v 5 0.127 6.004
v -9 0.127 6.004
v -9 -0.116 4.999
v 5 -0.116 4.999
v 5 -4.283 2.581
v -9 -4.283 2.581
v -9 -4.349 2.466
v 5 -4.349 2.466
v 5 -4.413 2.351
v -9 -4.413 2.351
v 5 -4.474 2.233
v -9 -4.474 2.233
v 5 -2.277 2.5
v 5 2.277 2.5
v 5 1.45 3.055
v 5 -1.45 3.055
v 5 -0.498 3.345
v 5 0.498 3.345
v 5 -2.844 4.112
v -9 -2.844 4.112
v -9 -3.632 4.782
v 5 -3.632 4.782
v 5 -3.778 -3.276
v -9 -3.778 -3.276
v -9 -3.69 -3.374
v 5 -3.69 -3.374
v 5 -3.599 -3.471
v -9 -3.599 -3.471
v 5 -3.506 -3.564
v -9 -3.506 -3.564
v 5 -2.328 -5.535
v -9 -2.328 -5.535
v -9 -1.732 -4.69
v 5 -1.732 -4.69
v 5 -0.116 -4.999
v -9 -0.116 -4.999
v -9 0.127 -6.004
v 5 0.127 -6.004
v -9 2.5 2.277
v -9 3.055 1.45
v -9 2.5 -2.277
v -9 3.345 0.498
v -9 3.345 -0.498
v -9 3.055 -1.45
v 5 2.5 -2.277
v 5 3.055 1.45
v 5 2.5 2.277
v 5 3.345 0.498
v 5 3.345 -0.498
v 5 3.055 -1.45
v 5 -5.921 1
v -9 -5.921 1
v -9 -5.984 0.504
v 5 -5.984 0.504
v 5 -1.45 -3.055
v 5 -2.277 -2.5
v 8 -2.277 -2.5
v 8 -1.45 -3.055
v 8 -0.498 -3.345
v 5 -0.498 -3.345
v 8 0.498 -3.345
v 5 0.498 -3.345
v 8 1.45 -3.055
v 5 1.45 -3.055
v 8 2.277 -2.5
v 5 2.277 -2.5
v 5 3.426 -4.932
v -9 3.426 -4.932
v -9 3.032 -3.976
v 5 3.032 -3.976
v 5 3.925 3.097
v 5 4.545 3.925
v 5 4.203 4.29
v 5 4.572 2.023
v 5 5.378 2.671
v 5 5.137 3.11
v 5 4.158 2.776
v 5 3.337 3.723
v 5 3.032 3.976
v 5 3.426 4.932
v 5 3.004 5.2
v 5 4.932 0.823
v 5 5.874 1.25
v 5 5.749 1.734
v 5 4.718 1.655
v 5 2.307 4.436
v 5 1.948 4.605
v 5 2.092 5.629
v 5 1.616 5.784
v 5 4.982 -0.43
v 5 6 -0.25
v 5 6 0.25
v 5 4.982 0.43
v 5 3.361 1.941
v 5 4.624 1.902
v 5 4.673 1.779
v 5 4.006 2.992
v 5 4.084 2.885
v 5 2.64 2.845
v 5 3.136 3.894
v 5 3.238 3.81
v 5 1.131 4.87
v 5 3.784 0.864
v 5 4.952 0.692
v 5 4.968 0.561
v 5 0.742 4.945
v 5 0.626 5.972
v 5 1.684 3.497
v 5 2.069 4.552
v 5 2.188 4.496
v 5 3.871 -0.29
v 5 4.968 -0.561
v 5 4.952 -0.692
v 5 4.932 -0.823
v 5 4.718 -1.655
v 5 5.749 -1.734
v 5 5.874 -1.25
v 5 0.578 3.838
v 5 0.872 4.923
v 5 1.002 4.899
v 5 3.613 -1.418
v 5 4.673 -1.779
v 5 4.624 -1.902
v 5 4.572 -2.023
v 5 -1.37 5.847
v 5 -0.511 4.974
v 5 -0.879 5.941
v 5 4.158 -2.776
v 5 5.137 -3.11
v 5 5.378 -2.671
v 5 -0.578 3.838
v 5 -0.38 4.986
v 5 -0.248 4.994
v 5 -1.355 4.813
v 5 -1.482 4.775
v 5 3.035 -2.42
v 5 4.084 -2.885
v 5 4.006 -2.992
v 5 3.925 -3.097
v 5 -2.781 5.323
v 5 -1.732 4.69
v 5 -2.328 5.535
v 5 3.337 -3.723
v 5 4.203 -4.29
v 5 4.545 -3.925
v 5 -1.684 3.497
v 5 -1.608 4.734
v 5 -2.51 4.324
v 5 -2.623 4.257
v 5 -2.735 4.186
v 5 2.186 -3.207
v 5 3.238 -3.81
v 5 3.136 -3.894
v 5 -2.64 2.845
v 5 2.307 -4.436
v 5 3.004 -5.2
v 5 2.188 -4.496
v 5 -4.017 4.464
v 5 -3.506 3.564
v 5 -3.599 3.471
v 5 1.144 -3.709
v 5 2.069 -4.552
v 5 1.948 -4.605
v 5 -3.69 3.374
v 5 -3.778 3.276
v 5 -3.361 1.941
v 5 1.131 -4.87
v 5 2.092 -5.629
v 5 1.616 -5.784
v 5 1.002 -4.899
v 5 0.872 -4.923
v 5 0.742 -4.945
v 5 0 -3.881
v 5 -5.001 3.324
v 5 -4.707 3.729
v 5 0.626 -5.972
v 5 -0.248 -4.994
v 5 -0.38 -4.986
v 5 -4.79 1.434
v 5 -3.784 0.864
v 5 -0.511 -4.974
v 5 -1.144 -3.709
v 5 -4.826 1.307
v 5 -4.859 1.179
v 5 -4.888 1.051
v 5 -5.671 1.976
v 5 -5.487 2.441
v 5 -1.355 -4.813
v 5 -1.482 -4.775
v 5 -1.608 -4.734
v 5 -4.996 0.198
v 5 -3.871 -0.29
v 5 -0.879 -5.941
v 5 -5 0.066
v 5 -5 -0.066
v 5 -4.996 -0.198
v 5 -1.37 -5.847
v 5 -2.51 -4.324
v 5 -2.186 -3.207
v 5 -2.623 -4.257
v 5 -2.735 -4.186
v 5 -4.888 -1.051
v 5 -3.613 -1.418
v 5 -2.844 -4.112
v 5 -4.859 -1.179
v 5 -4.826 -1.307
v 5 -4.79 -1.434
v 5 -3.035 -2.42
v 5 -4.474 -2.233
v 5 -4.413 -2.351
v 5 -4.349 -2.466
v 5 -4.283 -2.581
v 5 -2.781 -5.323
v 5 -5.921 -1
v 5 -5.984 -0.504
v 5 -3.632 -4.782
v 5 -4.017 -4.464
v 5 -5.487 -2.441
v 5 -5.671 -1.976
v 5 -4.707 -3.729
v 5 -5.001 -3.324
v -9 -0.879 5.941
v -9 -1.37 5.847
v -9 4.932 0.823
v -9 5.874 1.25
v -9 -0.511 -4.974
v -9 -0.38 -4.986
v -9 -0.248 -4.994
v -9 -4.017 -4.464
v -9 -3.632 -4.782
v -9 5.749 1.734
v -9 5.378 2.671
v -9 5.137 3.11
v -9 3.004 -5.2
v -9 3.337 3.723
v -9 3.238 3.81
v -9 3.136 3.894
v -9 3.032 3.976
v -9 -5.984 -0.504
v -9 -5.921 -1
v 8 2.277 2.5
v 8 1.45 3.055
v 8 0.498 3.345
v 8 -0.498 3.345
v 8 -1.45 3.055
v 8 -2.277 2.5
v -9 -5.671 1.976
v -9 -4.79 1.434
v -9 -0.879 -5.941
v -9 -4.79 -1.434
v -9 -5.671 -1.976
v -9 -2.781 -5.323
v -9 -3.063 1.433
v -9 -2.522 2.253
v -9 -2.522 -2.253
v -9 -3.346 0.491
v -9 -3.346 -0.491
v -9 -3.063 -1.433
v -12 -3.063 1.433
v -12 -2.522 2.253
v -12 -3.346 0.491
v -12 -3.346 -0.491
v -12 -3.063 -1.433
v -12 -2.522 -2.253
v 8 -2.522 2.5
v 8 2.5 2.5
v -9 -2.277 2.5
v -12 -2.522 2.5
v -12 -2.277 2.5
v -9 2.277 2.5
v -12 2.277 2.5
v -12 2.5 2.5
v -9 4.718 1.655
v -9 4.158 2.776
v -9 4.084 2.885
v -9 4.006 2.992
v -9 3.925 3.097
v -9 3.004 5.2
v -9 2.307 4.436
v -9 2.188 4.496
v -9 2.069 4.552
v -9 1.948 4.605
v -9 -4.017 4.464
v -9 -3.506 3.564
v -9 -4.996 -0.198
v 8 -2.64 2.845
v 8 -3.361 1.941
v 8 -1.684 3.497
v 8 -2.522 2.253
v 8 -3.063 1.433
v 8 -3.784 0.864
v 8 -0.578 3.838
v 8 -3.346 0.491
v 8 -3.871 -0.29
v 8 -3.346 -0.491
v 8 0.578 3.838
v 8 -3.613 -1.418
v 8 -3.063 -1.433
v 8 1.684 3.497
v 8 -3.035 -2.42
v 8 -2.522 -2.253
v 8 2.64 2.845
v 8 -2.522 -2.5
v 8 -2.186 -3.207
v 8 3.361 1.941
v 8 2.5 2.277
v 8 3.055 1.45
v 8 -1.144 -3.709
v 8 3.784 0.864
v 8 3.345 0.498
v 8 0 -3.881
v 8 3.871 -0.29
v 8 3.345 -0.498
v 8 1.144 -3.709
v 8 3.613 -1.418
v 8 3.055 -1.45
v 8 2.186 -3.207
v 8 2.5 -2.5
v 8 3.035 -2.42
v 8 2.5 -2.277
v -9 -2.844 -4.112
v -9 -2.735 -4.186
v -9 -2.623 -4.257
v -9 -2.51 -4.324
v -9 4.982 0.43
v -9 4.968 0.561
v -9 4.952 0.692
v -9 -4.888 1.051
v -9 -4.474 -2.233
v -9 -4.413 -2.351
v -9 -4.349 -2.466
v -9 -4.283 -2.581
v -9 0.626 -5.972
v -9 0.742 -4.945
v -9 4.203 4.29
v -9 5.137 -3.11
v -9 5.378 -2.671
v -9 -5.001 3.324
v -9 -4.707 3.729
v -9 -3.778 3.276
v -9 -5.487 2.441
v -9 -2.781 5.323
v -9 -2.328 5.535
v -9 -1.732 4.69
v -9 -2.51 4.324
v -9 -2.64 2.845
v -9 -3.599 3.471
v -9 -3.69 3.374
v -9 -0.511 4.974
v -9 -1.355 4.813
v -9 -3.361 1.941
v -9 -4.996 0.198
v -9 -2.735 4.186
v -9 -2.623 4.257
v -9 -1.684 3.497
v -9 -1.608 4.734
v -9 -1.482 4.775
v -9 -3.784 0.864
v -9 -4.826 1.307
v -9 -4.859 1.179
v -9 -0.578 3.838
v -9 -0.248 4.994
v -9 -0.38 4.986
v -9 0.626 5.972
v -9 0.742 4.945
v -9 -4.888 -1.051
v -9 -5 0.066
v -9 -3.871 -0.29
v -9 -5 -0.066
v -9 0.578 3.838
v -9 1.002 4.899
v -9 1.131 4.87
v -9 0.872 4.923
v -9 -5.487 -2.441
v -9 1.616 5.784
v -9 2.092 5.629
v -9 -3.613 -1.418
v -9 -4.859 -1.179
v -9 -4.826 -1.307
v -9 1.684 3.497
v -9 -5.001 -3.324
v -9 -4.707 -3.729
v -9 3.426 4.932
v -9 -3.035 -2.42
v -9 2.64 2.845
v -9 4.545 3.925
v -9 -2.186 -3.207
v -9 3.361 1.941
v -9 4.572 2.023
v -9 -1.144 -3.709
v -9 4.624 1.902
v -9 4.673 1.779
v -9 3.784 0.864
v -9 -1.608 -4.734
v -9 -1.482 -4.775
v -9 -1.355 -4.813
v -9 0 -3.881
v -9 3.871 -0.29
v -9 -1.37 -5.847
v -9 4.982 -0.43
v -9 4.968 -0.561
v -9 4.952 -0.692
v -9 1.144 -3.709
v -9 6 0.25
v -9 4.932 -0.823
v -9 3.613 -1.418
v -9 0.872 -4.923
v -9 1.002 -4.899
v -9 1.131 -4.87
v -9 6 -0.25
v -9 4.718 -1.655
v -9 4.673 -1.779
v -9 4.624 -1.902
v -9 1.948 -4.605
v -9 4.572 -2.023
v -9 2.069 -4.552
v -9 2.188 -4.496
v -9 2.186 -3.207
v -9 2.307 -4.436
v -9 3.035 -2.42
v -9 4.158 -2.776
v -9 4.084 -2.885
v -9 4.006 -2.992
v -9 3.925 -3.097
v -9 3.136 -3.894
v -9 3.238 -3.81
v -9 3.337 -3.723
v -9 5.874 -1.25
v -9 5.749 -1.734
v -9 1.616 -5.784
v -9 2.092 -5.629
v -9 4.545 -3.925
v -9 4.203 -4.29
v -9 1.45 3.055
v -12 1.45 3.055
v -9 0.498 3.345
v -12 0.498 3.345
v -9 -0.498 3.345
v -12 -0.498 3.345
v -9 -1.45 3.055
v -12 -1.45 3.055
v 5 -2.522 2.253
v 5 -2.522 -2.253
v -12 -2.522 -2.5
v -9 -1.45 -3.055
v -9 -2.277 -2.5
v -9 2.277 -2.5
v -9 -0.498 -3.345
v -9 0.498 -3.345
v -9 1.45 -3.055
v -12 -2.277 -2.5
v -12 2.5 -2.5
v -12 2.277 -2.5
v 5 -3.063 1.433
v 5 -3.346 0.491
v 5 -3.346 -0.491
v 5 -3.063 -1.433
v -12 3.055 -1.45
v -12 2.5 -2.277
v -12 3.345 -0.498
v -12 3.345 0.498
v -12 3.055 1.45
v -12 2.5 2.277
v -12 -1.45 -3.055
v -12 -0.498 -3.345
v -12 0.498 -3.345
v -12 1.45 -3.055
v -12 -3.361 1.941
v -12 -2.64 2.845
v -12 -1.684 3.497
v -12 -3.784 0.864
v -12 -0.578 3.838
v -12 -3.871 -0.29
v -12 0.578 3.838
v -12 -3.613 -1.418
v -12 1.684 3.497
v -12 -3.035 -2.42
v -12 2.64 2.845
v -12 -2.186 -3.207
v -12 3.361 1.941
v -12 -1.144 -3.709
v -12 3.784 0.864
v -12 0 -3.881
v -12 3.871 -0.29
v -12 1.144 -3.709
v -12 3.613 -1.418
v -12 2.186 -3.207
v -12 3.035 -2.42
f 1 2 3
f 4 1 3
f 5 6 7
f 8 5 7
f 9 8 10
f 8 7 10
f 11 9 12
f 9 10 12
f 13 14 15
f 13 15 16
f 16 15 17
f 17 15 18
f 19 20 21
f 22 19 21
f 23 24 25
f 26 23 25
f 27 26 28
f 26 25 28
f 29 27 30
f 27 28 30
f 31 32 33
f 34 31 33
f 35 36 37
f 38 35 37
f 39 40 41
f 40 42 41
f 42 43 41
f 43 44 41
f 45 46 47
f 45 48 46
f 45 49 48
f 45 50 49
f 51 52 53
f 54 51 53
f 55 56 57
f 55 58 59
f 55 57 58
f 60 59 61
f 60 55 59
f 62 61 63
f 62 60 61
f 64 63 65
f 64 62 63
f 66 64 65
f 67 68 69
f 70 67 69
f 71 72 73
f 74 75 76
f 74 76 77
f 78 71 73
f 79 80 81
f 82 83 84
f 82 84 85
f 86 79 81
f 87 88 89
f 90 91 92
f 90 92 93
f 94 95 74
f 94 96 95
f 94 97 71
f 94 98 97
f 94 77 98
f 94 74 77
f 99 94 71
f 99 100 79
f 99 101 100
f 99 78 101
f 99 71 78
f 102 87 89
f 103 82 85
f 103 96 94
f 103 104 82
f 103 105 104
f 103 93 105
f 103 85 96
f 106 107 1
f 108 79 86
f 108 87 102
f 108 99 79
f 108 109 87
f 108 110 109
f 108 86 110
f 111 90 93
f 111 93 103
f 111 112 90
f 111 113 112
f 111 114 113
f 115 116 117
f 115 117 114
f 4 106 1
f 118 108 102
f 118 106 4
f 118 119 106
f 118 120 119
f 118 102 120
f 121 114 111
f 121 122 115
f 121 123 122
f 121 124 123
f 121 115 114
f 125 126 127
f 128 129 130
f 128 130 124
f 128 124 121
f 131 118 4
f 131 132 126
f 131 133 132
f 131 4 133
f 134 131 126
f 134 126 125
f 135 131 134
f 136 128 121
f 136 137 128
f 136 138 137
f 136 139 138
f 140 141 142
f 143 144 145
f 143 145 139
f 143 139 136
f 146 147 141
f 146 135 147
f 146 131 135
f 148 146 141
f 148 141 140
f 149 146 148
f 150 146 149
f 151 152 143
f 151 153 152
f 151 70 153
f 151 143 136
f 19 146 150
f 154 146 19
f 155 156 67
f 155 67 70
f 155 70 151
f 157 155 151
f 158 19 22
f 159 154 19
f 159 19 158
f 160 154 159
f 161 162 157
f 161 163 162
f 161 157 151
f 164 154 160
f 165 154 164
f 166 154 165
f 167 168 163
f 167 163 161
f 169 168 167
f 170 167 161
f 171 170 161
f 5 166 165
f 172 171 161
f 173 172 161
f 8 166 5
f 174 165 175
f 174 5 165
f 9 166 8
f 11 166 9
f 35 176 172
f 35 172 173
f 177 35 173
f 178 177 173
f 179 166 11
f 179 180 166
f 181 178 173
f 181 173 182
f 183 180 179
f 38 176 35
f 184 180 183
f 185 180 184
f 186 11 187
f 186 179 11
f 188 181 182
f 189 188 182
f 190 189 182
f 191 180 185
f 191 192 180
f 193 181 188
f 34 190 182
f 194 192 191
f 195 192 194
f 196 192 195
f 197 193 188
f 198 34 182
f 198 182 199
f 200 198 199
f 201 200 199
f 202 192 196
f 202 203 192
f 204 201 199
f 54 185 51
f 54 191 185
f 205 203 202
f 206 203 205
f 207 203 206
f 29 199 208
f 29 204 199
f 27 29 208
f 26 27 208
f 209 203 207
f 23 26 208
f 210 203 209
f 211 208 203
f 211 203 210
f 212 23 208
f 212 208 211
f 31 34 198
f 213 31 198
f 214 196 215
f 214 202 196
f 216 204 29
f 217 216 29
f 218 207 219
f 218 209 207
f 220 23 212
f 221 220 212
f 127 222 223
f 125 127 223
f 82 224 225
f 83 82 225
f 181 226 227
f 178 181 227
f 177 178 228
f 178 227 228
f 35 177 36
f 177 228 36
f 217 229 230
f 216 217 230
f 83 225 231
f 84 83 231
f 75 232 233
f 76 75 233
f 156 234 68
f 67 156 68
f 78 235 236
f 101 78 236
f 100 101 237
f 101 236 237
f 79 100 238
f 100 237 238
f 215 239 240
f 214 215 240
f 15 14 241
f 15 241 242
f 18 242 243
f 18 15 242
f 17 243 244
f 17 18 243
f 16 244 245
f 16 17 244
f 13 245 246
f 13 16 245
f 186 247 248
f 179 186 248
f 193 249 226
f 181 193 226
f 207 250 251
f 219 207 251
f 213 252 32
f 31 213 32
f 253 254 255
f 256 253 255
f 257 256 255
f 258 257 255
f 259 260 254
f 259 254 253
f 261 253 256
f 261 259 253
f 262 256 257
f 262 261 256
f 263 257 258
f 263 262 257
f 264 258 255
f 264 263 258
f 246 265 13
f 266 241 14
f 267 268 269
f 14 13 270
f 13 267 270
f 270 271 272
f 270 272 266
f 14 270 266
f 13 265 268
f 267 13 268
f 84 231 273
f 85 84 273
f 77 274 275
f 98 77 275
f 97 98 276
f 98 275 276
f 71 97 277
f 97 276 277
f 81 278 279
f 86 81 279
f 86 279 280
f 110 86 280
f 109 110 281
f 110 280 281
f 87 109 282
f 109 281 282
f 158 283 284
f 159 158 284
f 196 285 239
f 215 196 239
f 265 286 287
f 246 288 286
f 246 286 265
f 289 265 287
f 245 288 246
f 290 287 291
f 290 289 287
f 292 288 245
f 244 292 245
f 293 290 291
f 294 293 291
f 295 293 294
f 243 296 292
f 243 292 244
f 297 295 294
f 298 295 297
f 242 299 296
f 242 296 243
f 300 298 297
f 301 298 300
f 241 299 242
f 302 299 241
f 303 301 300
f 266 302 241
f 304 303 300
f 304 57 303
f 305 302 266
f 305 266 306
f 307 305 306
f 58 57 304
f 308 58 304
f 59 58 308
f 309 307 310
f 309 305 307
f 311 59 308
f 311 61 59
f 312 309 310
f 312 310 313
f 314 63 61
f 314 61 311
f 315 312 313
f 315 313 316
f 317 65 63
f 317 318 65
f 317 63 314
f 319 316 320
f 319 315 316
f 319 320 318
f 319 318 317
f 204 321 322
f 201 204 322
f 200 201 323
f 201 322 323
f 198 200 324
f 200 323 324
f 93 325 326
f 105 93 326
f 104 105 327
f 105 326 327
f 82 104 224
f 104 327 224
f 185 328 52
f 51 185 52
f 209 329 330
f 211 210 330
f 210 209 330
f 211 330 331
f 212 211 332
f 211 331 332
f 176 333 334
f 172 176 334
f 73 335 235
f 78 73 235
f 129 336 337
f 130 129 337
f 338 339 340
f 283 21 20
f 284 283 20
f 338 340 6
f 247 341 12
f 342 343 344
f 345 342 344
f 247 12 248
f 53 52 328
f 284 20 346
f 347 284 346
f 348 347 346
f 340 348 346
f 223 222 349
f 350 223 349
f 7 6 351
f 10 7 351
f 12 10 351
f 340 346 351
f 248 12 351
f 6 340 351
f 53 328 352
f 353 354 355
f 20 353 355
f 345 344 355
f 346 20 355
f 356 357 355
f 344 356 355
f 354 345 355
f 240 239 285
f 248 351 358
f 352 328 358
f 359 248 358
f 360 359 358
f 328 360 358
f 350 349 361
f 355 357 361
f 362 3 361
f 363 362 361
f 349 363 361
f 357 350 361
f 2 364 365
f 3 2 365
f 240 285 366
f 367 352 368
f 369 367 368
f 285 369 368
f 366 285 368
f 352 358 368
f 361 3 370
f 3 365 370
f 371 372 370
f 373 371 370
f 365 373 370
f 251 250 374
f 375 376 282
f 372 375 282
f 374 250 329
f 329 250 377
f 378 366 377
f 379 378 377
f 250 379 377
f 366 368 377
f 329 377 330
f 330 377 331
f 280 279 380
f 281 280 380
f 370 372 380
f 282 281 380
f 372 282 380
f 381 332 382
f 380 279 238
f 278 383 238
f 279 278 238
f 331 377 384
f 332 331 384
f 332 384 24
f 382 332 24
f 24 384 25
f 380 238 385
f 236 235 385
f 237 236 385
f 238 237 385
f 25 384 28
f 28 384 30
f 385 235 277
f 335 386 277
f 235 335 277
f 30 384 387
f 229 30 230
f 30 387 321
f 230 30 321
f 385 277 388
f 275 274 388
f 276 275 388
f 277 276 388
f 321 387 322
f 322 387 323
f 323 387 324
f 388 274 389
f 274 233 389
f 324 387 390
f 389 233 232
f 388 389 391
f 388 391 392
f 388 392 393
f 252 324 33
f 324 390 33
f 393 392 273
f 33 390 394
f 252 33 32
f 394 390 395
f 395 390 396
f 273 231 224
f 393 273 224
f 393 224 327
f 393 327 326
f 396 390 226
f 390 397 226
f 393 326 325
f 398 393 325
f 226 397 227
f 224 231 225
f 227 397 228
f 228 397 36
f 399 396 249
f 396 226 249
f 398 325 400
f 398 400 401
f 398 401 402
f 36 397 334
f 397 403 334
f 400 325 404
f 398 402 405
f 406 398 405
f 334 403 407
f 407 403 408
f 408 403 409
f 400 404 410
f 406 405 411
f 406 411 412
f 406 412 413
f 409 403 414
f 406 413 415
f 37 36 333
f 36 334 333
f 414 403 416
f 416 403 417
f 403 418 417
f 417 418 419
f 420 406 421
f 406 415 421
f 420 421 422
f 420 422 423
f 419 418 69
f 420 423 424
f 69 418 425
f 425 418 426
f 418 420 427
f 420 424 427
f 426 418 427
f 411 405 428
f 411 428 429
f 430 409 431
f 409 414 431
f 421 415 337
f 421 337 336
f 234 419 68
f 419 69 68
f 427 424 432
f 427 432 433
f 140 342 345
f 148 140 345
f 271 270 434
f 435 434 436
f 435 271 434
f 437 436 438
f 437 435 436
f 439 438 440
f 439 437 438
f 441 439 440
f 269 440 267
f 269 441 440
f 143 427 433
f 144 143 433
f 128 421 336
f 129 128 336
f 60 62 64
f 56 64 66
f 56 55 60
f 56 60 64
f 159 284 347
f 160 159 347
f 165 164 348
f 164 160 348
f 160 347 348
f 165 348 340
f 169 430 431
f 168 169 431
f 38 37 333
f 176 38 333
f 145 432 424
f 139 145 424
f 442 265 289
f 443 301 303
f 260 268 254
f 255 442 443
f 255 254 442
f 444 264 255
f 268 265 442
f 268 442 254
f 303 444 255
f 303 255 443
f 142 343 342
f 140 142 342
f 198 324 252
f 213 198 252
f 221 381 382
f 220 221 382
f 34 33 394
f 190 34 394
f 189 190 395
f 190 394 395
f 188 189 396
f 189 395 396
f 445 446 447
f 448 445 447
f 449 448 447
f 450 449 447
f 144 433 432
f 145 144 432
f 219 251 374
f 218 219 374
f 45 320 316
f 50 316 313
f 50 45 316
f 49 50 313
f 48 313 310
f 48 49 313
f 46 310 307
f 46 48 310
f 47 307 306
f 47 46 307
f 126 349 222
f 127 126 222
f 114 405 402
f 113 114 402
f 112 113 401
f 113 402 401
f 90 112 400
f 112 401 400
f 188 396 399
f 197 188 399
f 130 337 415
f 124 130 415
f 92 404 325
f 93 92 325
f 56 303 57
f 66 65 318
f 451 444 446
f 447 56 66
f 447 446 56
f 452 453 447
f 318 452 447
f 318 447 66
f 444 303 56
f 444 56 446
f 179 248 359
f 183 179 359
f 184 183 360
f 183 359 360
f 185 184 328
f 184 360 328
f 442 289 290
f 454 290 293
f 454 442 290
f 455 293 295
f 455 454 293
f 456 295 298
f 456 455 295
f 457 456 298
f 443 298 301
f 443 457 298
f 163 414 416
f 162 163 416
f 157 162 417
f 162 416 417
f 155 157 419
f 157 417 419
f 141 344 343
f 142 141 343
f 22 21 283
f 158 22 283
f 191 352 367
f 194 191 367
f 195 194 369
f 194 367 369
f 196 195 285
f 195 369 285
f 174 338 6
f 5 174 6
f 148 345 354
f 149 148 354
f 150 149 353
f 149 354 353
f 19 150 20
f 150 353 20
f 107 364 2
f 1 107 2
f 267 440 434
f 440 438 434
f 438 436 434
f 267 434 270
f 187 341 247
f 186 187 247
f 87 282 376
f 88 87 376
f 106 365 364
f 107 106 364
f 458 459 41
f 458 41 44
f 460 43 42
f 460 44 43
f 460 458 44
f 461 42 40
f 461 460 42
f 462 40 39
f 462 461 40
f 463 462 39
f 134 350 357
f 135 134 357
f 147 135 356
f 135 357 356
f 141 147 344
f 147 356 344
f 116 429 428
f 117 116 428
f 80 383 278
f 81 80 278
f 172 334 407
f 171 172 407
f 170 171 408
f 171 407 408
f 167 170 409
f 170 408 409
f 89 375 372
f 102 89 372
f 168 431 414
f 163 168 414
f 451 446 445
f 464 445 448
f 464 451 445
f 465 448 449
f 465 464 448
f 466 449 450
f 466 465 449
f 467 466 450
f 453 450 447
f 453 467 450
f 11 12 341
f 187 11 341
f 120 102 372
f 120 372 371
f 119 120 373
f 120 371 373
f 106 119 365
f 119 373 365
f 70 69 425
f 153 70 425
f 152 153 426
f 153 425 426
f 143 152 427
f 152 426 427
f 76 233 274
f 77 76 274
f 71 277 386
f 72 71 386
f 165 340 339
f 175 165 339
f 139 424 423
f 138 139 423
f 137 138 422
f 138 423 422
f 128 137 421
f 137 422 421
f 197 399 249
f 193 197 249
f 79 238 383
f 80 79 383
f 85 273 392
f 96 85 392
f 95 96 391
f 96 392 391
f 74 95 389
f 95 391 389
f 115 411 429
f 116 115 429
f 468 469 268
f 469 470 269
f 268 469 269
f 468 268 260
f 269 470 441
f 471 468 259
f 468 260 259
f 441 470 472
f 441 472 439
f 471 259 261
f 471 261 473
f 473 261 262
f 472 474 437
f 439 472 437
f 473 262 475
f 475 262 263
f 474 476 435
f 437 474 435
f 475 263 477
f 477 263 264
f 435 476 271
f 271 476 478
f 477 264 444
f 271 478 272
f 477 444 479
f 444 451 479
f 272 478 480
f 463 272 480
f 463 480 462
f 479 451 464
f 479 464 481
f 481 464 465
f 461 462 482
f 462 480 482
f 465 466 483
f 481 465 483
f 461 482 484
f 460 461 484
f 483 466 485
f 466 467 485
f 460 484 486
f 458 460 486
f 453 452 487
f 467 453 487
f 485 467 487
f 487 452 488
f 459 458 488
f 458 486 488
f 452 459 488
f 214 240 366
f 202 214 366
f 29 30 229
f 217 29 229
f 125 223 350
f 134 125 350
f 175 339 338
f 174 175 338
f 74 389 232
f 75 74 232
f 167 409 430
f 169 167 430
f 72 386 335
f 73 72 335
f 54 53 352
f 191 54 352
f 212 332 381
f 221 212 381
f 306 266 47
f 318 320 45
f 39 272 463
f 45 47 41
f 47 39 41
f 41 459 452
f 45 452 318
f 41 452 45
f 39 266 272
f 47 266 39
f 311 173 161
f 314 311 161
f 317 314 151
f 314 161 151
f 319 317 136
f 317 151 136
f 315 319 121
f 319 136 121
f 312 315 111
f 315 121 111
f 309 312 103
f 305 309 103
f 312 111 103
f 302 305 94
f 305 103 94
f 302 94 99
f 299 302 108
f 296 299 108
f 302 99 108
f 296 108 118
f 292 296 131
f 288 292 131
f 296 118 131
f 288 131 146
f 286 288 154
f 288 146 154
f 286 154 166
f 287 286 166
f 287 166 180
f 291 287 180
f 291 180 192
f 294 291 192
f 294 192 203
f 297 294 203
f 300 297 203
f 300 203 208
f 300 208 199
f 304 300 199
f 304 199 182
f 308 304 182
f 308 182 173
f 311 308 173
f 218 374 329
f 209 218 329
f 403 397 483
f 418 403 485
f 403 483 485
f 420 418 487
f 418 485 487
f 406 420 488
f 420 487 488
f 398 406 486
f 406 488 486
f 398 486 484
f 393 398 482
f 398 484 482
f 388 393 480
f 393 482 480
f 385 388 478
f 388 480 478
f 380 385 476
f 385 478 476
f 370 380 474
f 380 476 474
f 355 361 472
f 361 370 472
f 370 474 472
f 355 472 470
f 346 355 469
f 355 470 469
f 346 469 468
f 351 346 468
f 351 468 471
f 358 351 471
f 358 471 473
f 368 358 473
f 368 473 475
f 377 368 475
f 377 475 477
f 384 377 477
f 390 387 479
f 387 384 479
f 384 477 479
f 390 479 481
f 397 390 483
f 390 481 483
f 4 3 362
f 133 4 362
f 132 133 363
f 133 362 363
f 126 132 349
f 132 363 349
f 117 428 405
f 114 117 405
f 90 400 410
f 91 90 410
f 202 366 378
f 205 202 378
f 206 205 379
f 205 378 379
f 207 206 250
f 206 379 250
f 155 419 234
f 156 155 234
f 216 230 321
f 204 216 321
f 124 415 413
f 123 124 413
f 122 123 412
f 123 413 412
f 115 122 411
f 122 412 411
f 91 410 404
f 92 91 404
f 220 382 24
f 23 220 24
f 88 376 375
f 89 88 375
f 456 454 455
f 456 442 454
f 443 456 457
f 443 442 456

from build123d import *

# Parameters (mm, degrees)
BOSS_EXTRUDE2_START      = -9
BOSS_EXTRUDE2_DEPTH      = 14
BOSS_EXTRUDE3_DEPTH      = 5
BOSS_EXTRUDE3_DEPTH_BACK = 9
SKETCH3_R                = 5
CIRPATTERN1_COUNT        = 25
SKETCH4_W                = 5
SKETCH4_H                = 5
CUT_EXTRUDE1_DEPTH       = 18
BOSS_EXTRUDE4_DEPTH      = 3
BOSS_EXTRUDE4_DEPTH_BACK = 17
SKETCH6_R                = 3.881431072
SKETCH6_R_2              = 3.381431072
CUT_EXTRUDE2_DEPTH       = 10
CUT_EXTRUDE2_DEPTH_BACK  = 20
SKETCH7_W                = 5
SKETCH7_H                = 5.021637953


with BuildPart() as part:
    # Sketch2 → Boss-Extrude2 (new body)
    with BuildSketch(Plane(origin=(0, 0, 0), x_dir=(0, 0, -1), z_dir=(1, 0, 0)).offset(BOSS_EXTRUDE2_START)):
        with BuildLine():
            ThreePointArc((0.429587035, 4.981511315), (0, 5), (-0.429587035, 4.981511315))
            Line((-0.429587035, 4.981511315), (-0.700772987, 3.443539352))
            Line((-0.700772987, 3.443539352), (0.700772987, 3.443539352))
            Line((0.700772987, 3.443539352), (0.429587035, 4.981511315))
        make_face()
        with BuildLine():
            Line((0.25, 6), (-0.25, 6))
            Line((-0.25, 6), (-0.429587035, 4.981511315))
            ThreePointArc((-0.429587035, 4.981511315), (0, 5), (0.429587035, 4.981511315))
            Line((0.429587035, 4.981511315), (0.25, 6))
        make_face()
    boss_extrude2 = extrude(amount=BOSS_EXTRUDE2_DEPTH)

    # Sketch3 → Boss-Extrude3 (add, two sides: drawn at the far end of the back side and taken through both)
    with BuildSketch(Plane(origin=(0, 0, 0), x_dir=(0, 0, -1), z_dir=(1, 0, 0)).offset(-BOSS_EXTRUDE3_DEPTH_BACK)):
        Circle(SKETCH3_R)
    extrude(amount=BOSS_EXTRUDE3_DEPTH + BOSS_EXTRUDE3_DEPTH_BACK)

    # CirPattern1: Boss-Extrude2 ×25 about axis
    cirpattern1_axis = Axis((0, 0, 0), (1, 0, 0))
    for i in range(1, CIRPATTERN1_COUNT):
        add(boss_extrude2.rotate(cirpattern1_axis, i * 360 / CIRPATTERN1_COUNT))

    # Sketch4 → Cut-Extrude1 (cut)
    with BuildSketch(Plane(origin=(5, 0, 0), x_dir=(0, 0, -1), z_dir=(1, 0, 0))):
        Rectangle(SKETCH4_W, SKETCH4_H)
    extrude(amount=-CUT_EXTRUDE1_DEPTH, mode=Mode.SUBTRACT)

    # Sketch6 → Boss-Extrude4 (add, two sides: drawn at the far end of the back side and taken through both)
    with BuildSketch(Plane(origin=(5, 0, 0), x_dir=(0, 0, -1), z_dir=(1, 0, 0)).offset(-BOSS_EXTRUDE4_DEPTH_BACK)):
        Circle(SKETCH6_R)
        Circle(SKETCH6_R_2, mode=Mode.SUBTRACT)
    extrude(amount=BOSS_EXTRUDE4_DEPTH + BOSS_EXTRUDE4_DEPTH_BACK)

    # Sketch7 → Cut-Extrude2 (cut, two sides: drawn at the far end of the back side and taken through both)
    with BuildSketch(Plane(origin=(5, 0, 0), x_dir=(0, 0, -1), z_dir=(1, 0, 0)).offset(-CUT_EXTRUDE2_DEPTH_BACK)):
        with Locations((0, -0.010818977)):
            Rectangle(SKETCH7_W, SKETCH7_H)
    extrude(amount=CUT_EXTRUDE2_DEPTH + CUT_EXTRUDE2_DEPTH_BACK, mode=Mode.SUBTRACT)


solid = part.part
